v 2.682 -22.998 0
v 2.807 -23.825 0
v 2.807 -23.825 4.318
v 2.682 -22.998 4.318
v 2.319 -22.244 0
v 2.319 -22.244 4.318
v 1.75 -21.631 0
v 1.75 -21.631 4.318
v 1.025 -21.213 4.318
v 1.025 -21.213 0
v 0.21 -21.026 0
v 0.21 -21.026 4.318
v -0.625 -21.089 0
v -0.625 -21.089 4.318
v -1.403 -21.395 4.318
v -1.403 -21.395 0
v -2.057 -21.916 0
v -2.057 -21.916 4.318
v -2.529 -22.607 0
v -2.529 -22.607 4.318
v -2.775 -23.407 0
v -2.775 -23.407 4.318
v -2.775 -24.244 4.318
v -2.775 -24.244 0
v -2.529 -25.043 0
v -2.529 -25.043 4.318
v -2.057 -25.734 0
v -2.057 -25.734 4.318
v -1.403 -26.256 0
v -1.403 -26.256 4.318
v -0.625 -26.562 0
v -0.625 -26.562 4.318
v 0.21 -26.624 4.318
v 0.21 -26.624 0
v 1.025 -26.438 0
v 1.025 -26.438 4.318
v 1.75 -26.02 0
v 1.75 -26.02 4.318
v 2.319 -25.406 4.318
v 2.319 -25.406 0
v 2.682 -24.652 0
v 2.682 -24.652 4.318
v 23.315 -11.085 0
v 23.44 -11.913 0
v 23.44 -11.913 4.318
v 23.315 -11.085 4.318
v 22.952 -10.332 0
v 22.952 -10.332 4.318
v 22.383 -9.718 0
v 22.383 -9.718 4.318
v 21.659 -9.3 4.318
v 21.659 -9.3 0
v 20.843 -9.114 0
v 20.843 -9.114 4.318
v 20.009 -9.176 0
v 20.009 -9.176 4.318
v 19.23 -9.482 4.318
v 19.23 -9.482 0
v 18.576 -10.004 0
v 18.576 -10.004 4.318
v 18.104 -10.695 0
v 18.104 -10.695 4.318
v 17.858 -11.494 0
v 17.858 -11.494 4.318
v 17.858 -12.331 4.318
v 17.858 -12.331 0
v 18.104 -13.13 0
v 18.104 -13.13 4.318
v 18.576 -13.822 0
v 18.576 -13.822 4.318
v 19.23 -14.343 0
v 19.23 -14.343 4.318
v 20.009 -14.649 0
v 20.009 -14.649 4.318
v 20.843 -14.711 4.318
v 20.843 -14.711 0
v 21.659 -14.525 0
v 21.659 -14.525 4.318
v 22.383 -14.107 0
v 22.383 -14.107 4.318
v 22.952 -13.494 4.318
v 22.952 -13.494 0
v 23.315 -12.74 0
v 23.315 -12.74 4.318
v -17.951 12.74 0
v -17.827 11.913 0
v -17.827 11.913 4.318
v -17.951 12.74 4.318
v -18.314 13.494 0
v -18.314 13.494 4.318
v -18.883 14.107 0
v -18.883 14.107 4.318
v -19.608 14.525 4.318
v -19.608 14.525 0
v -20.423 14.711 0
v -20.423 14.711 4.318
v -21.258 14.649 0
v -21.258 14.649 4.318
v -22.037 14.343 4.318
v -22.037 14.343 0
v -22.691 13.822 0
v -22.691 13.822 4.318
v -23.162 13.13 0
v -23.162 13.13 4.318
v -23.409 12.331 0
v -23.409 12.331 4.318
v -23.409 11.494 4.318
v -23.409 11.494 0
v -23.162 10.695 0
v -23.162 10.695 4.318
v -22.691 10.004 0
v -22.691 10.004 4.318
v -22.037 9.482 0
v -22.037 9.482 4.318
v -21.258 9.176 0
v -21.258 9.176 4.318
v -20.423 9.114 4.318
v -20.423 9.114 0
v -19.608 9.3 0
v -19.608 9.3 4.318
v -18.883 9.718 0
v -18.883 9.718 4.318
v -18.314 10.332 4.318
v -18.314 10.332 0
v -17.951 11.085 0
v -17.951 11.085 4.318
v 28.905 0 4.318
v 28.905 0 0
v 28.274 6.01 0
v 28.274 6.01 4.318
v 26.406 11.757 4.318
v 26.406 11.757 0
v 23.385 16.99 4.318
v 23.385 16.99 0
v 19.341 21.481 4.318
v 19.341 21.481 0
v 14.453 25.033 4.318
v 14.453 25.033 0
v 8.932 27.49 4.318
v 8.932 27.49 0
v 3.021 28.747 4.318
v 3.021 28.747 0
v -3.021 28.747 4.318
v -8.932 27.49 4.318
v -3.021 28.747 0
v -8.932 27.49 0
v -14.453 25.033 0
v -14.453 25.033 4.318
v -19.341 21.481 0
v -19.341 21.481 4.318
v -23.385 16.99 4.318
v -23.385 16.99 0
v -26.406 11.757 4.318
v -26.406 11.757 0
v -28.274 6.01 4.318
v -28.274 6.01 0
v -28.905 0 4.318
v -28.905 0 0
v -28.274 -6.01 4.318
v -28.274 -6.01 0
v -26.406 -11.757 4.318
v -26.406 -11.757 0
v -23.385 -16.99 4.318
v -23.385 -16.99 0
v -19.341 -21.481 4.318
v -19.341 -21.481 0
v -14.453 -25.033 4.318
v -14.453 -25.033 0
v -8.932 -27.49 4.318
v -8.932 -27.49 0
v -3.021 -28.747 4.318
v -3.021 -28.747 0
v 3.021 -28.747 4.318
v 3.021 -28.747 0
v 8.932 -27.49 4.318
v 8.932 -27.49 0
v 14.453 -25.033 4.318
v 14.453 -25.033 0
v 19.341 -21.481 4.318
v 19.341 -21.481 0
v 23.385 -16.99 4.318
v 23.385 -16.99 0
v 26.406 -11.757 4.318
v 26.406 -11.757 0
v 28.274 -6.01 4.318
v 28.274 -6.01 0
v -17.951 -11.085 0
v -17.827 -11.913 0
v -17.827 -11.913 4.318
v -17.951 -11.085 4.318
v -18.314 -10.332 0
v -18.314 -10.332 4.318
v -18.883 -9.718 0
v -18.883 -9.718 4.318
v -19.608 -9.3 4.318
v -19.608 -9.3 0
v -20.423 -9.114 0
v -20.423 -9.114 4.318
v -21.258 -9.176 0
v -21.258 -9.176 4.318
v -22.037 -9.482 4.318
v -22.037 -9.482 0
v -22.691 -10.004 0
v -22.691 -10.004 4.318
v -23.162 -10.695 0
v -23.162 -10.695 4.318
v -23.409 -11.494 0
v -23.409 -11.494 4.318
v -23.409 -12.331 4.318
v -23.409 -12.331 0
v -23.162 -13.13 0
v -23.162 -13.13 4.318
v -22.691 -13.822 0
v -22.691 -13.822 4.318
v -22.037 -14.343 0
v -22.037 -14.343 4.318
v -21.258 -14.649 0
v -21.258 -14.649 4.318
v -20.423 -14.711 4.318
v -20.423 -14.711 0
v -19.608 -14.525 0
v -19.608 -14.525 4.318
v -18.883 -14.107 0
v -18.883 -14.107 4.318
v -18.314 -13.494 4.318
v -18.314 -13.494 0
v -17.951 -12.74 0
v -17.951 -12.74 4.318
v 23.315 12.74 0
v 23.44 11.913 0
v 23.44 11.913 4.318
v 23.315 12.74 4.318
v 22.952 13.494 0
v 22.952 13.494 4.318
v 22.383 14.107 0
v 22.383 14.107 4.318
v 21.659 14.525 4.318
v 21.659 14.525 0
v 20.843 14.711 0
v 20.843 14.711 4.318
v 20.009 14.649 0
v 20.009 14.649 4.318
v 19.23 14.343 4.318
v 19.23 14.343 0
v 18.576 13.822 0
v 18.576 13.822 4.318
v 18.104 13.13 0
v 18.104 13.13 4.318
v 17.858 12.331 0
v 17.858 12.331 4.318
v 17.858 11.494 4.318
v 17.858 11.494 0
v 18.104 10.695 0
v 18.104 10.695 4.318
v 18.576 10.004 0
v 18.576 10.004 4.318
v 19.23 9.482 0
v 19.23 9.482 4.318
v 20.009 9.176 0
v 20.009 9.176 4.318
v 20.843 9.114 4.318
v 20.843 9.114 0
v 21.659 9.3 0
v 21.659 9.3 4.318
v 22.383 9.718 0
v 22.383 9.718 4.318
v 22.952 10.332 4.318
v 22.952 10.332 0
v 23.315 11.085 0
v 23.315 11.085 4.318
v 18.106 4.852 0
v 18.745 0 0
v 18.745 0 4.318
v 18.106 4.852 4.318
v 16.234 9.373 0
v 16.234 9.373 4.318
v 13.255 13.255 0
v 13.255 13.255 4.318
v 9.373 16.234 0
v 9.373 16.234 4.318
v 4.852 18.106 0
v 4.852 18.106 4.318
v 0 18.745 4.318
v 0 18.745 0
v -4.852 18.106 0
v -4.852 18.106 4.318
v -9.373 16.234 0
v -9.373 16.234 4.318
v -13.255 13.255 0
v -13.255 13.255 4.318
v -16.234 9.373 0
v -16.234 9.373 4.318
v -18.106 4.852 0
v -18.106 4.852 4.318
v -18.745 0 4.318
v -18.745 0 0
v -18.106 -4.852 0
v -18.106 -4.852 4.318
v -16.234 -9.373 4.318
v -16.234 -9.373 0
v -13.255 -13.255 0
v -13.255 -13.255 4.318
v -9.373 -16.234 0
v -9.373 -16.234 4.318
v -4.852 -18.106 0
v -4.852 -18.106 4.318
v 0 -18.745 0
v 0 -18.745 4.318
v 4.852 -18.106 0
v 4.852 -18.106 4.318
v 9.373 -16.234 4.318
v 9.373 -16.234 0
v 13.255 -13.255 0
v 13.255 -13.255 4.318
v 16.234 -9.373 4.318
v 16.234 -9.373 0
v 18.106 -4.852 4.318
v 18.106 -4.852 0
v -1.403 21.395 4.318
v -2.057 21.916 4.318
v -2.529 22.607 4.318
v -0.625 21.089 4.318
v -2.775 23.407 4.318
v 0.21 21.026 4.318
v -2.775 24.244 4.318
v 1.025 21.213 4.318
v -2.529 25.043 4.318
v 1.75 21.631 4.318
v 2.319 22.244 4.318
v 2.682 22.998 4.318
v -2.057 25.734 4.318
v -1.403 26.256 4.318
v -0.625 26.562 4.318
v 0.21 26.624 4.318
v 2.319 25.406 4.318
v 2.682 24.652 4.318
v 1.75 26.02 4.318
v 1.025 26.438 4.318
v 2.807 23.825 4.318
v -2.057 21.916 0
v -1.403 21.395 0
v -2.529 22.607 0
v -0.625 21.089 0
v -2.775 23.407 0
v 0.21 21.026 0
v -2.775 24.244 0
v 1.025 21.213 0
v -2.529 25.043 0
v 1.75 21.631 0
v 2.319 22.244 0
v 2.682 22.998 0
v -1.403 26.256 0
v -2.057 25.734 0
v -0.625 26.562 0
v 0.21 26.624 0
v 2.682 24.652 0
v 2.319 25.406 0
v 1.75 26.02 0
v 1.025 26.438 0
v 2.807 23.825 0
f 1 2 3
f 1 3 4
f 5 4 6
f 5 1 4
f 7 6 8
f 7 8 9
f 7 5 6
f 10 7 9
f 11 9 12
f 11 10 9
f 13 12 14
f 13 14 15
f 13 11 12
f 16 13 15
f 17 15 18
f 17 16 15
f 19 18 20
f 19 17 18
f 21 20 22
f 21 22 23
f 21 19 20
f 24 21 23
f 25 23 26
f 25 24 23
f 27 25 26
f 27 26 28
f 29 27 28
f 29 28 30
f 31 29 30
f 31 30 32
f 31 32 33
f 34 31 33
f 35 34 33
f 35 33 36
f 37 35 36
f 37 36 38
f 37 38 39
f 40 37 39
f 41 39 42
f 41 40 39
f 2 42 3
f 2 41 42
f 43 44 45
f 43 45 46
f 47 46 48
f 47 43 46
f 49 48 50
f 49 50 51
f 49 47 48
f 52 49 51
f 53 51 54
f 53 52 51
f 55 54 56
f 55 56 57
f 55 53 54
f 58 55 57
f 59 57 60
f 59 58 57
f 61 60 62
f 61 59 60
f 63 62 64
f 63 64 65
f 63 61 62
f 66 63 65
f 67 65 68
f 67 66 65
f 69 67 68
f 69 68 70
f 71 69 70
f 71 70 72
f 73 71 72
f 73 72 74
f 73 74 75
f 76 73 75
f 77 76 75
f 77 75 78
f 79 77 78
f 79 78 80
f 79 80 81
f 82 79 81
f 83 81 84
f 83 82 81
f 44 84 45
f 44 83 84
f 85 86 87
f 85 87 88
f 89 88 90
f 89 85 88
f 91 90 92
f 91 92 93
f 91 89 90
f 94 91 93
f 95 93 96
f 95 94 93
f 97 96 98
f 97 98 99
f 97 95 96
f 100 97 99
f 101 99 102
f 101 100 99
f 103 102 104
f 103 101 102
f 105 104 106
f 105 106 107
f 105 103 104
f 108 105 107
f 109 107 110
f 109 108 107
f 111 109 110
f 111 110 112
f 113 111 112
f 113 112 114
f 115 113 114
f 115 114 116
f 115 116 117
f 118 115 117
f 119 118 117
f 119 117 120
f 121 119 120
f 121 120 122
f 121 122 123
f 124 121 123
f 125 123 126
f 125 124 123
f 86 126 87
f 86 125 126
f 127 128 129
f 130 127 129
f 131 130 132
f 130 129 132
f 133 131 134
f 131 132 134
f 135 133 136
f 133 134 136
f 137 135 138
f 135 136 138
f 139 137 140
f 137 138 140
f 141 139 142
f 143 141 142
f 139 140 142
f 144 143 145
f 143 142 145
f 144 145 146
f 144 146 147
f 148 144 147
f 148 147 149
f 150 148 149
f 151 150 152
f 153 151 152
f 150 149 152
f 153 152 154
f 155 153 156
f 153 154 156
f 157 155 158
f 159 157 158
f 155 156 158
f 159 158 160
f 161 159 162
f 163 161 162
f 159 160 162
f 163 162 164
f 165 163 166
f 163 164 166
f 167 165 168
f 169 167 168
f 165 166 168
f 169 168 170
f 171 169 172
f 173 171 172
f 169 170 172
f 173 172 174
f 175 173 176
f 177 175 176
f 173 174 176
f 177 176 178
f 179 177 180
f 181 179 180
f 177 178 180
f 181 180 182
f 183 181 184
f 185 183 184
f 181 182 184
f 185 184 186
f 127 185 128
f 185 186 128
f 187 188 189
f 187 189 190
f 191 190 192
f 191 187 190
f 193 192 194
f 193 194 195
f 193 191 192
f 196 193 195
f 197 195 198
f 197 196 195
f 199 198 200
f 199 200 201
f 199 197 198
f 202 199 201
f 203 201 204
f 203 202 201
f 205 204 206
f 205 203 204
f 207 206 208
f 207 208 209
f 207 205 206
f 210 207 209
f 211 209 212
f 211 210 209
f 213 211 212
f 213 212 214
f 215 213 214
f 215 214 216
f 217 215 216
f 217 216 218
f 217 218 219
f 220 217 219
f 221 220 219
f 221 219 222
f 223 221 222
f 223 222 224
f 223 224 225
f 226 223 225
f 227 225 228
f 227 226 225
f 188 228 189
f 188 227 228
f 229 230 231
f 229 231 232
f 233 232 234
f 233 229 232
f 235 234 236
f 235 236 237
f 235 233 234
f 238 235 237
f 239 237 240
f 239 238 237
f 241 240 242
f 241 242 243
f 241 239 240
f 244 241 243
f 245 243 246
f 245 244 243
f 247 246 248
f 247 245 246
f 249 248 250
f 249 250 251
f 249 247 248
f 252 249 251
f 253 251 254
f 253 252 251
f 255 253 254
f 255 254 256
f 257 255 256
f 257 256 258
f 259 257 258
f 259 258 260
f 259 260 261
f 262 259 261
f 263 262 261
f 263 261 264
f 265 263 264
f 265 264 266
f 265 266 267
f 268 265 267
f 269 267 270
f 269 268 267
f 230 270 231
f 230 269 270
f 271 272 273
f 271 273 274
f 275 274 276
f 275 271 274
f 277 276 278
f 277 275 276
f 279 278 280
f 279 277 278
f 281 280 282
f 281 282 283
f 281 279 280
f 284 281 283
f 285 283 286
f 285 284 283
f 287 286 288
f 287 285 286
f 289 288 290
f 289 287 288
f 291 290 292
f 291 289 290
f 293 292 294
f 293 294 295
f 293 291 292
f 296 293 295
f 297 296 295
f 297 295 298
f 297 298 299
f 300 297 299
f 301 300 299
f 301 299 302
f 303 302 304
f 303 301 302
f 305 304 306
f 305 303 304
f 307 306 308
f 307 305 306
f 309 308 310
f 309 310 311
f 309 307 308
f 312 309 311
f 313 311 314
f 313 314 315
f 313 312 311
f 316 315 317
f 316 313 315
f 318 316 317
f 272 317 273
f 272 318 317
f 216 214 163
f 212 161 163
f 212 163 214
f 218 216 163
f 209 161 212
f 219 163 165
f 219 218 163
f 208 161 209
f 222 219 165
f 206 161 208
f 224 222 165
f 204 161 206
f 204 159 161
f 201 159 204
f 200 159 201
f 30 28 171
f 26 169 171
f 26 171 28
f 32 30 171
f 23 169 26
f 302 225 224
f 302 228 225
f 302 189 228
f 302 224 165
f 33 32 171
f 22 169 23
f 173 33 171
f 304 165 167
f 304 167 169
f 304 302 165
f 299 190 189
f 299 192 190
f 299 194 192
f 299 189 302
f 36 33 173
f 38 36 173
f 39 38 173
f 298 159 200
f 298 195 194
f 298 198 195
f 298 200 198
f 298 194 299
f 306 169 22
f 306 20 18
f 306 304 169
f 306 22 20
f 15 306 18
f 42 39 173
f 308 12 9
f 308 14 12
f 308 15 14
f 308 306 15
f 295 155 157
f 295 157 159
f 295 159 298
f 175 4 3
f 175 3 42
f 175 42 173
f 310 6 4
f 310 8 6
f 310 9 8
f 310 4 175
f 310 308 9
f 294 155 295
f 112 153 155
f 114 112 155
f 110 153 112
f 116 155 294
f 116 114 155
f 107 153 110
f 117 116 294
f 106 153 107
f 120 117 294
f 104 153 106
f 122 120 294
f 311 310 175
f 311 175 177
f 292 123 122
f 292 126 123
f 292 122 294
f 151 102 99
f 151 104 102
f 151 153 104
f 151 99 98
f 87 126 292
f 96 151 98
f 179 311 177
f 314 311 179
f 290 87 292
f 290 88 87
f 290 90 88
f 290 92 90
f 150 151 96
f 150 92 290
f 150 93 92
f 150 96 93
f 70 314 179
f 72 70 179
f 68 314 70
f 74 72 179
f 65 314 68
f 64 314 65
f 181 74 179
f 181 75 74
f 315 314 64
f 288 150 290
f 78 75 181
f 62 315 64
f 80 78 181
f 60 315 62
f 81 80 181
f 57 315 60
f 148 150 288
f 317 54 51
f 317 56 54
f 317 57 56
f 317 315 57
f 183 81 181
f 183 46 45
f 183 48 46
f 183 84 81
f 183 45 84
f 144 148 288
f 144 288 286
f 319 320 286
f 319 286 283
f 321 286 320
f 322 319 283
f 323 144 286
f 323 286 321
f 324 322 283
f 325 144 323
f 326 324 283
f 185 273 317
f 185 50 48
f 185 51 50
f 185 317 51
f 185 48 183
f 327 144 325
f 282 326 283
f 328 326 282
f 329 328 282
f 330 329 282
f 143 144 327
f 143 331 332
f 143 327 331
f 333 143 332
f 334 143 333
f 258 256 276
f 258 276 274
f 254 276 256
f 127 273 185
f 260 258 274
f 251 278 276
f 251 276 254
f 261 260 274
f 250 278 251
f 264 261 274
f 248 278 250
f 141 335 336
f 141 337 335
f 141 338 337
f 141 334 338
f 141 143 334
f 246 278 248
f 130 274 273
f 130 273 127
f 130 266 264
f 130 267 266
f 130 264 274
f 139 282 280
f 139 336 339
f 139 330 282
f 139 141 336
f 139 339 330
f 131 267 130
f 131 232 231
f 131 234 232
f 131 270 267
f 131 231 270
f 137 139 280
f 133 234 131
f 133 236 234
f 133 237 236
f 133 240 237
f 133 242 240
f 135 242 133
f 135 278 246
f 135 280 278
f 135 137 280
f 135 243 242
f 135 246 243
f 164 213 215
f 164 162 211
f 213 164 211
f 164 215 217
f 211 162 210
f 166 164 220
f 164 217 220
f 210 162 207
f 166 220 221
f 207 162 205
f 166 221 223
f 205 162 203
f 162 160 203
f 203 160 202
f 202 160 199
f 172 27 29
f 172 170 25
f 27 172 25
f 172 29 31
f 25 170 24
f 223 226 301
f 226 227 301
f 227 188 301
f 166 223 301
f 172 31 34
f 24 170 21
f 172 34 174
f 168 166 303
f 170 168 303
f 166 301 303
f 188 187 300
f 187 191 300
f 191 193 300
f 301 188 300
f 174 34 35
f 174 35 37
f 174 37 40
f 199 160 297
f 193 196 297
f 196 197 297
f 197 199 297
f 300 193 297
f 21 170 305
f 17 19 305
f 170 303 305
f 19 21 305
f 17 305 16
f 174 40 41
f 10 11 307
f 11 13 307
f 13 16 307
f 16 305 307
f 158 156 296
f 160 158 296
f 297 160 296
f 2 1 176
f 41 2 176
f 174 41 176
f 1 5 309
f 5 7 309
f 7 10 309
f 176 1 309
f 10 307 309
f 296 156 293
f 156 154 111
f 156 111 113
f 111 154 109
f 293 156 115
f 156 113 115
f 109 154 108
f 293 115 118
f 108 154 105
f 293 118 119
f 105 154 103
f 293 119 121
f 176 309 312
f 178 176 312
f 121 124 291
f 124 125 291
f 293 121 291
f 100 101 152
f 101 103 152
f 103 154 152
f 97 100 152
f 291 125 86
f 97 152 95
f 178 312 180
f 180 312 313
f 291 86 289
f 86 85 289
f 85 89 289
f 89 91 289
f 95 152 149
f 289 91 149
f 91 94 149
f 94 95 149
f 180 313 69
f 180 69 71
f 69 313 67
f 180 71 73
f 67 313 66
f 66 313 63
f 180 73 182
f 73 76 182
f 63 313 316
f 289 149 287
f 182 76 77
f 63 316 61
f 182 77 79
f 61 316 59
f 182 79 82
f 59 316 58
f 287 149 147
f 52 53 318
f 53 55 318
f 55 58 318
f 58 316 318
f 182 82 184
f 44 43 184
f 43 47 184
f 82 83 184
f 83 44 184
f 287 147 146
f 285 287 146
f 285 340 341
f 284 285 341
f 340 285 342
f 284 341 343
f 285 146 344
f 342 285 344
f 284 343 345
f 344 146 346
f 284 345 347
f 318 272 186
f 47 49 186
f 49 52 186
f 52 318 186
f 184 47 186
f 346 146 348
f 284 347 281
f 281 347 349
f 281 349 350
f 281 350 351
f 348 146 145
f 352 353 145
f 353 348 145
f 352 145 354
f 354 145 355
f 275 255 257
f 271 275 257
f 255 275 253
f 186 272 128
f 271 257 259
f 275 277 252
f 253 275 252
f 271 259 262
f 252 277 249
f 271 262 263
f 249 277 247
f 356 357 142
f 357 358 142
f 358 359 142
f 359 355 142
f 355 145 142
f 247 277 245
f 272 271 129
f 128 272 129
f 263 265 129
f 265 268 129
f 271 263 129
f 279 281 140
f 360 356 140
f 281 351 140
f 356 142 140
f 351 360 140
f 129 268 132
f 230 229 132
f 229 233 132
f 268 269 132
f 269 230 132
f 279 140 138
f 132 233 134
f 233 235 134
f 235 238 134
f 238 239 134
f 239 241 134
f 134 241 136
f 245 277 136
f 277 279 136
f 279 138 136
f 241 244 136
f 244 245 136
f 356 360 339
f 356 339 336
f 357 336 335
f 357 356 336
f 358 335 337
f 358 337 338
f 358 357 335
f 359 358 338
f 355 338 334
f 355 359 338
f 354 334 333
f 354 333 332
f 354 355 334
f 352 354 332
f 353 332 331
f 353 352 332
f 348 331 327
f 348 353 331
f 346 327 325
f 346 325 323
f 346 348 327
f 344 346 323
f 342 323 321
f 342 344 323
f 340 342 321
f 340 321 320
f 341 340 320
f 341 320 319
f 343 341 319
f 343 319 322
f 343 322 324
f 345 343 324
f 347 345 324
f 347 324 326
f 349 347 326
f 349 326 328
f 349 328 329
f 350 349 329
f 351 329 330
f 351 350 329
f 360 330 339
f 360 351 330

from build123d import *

# Parameters (mm, degrees)
SKETCH1_R           = 28.9052
SKETCH1_R_2         = 2.8067
SKETCH1_R_3         = 18.7452
BOSS_EXTRUDE1_DEPTH = 4.318


with BuildPart() as part:
    # Sketch1 → Boss-Extrude1 (new body)
    with BuildSketch(Plane.XY):
        Circle(SKETCH1_R)
        with Locations((0, 23.8252)):
            Circle(SKETCH1_R_2, mode=Mode.SUBTRACT)
        with Locations((20.63322845, 11.9126)):
            Circle(SKETCH1_R_2, mode=Mode.SUBTRACT)
        with Locations((20.63322845, -11.9126)):
            Circle(SKETCH1_R_2, mode=Mode.SUBTRACT)
        with Locations((0, -23.8252)):
            Circle(SKETCH1_R_2, mode=Mode.SUBTRACT)
        with Locations((-20.63322845, -11.9126)):
            Circle(SKETCH1_R_2, mode=Mode.SUBTRACT)
        with Locations((-20.63322845, 11.9126)):
            Circle(SKETCH1_R_2, mode=Mode.SUBTRACT)
        Circle(SKETCH1_R_3, mode=Mode.SUBTRACT)
    extrude(amount=BOSS_EXTRUDE1_DEPTH)


solid = part.part
